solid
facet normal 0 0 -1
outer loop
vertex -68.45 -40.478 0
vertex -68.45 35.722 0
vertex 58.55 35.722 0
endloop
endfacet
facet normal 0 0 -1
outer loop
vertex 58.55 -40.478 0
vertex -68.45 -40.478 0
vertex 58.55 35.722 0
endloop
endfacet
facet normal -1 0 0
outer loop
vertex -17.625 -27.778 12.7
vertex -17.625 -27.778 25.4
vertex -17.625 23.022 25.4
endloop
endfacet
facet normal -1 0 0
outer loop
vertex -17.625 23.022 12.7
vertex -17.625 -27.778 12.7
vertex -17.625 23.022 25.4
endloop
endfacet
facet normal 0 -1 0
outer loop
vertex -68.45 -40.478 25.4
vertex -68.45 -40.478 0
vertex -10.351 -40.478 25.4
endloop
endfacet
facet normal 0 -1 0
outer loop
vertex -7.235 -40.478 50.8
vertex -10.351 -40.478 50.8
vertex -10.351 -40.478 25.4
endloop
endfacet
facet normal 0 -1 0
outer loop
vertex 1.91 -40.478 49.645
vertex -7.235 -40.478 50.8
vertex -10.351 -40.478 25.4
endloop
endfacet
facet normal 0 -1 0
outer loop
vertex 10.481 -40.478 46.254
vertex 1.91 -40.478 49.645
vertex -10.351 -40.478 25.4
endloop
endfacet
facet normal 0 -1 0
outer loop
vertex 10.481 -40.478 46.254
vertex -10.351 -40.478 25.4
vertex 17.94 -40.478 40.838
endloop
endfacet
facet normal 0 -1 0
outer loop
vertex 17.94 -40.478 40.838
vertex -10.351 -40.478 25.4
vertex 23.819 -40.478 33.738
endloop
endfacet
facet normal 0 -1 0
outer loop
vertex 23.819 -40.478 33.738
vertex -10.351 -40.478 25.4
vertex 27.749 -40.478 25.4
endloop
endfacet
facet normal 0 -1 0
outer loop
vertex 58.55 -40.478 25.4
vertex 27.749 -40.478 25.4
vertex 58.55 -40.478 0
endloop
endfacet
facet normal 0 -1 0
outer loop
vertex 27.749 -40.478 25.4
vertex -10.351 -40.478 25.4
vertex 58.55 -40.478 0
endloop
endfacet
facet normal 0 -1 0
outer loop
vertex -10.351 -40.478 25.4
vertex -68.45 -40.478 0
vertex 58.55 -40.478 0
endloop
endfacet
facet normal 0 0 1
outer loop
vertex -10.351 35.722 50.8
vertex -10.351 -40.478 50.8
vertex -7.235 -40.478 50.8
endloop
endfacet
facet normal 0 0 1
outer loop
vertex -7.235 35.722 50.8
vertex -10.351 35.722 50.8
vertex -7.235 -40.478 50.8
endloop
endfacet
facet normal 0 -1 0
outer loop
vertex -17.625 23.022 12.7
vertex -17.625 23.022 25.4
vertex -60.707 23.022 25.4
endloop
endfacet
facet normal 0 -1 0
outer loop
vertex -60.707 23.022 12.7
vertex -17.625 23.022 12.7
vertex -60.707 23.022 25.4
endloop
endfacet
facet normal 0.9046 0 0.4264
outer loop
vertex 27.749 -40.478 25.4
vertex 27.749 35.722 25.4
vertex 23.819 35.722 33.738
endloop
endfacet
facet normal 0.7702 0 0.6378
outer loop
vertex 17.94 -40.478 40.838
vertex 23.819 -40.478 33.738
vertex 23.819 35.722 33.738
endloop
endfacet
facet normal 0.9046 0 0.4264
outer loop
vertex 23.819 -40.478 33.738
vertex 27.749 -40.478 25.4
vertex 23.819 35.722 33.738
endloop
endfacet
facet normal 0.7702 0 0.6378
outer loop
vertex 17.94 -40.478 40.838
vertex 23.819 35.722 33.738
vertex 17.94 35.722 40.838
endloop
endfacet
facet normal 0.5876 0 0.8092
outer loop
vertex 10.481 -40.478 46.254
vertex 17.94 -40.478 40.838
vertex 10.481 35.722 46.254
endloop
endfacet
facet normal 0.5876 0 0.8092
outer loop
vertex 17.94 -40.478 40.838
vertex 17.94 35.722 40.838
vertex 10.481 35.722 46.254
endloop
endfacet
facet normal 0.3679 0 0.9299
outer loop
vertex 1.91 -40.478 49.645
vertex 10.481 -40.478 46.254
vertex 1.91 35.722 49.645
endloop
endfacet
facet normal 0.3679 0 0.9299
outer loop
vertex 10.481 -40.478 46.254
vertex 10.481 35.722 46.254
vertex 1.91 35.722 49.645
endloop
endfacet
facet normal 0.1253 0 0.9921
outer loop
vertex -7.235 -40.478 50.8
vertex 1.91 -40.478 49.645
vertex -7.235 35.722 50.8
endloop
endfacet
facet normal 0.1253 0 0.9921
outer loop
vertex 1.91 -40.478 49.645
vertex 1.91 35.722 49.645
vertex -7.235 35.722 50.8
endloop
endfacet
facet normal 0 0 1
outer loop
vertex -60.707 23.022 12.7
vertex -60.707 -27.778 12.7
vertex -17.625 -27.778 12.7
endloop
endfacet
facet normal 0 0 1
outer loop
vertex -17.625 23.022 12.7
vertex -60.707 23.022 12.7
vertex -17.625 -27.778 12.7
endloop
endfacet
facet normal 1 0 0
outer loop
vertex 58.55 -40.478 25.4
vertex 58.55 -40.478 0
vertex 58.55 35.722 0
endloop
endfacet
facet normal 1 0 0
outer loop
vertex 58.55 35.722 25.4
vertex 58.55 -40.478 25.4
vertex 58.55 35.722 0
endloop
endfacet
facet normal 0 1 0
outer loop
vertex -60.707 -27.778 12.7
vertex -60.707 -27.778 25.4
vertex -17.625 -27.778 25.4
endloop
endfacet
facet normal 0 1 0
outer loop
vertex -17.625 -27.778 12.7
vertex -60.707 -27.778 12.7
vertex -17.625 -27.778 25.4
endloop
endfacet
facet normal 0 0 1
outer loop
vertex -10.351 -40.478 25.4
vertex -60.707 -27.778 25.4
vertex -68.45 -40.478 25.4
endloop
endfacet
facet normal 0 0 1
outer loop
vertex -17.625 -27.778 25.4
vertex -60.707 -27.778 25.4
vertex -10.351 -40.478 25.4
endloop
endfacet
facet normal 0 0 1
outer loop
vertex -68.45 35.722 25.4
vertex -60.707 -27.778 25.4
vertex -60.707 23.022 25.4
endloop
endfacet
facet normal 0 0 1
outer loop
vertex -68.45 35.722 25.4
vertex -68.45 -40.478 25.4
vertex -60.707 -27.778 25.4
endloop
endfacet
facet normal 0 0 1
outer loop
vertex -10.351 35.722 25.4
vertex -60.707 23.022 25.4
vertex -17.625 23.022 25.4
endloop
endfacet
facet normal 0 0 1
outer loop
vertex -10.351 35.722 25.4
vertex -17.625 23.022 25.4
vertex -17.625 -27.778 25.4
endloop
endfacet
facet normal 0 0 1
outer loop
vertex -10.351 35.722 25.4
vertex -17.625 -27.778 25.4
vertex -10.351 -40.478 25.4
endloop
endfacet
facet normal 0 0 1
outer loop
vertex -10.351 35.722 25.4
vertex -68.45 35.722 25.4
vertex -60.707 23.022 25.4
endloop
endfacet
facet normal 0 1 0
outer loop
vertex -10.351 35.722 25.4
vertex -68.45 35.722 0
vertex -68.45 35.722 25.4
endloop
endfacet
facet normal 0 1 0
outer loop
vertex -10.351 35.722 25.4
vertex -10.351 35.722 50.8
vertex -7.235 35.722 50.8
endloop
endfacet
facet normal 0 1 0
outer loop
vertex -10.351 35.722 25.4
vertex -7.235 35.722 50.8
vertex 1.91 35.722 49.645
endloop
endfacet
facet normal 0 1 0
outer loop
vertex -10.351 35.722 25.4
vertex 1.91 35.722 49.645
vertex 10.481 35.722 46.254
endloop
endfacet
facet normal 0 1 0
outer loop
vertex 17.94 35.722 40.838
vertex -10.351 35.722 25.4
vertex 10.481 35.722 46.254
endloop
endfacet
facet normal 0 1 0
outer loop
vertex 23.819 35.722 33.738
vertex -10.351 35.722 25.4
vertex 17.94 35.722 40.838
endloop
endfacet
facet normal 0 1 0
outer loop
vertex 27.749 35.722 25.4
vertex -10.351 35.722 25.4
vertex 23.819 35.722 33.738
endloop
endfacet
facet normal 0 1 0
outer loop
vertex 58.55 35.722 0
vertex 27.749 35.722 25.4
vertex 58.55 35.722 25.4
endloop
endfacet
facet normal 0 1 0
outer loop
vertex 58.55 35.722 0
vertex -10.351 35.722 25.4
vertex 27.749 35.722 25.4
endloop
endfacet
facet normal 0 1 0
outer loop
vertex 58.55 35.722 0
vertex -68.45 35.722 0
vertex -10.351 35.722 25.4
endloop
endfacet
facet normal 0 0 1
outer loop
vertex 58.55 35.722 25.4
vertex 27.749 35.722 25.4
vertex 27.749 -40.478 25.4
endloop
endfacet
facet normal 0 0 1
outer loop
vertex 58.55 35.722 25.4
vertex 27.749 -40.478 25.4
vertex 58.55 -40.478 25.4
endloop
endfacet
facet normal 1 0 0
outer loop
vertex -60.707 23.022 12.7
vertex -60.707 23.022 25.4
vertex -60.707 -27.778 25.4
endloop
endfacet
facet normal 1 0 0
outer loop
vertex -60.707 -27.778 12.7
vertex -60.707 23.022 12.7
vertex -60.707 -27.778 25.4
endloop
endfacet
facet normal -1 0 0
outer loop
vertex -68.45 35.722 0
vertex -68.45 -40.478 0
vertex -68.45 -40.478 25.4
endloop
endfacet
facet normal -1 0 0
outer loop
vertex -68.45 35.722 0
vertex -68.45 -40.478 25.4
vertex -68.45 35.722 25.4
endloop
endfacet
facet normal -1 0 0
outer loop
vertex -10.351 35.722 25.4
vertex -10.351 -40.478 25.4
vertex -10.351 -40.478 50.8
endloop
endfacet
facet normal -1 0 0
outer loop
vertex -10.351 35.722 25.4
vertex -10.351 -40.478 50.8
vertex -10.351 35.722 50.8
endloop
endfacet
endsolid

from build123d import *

# Parameters (mm, degrees)
F0_W        = 127
F0_H        = 76.2
F1_DEPTH    = 25.4
F2_W        = 38.1
F2_H        = 76.2
F3_DEPTH    = 25.4
F4_T1_DEPTH = 251.1217558139
F6_DEPTH    = 12.7


# Not quite as in the source:
# - a fillet or chamfer that OpenCascade refuses, or shapes differently, is made with other operations: its cross-section is extruded or revolved along the edge and cut away or added


with BuildPart() as f1:
    # F0 (on Top) → F1 (new body)
    with BuildSketch(Plane.XY):
        with Locations((-4.94965637, -2.3779198527)):
            Rectangle(F0_W, F0_H)
    extrude(amount=F1_DEPTH)

    # F2 (on face) → F3 (join)
    with BuildSketch(Plane.XY.offset(25.4)):
        with Locations((8.6990555257, -2.3779198527)):
            Rectangle(F2_W, F2_H)
    extrude(amount=F3_DEPTH)

    # F4: fillet of radius 36.7926146906 on 1 edges, made by hand

    # F4_s2 → F4_t1 (cut)
    with BuildSketch(Plane.XZ.offset(-123.1829580542)):
        with BuildLine():
            ThreePointArc((27.7490555257, 25.4), (14.3810455558, 43.7803644885), (-7.2352956371, 50.8))
            Line((-7.2352956371, 50.8), (27.7490555257, 50.8))
            Line((27.7490555257, 50.8), (27.7490555257, 25.4))
        make_face()
    extrude(amount=F4_T1_DEPTH, mode=Mode.SUBTRACT)

    # F5 (on face) → F6 (cut)
    with BuildSketch(Plane.XY.offset(25.4)):
        Polygon((-39.4003004222, 23.0220801473), (-60.7068873942, 23.0220801473), (-60.7068873942, -27.7779198527), (-39.4003004222, -27.7779198527), (-17.6245812327, -27.7779198527), (-17.6245812327, 23.0220801473), align=None)
    extrude(amount=-F6_DEPTH, mode=Mode.SUBTRACT)


solid = f1.part
